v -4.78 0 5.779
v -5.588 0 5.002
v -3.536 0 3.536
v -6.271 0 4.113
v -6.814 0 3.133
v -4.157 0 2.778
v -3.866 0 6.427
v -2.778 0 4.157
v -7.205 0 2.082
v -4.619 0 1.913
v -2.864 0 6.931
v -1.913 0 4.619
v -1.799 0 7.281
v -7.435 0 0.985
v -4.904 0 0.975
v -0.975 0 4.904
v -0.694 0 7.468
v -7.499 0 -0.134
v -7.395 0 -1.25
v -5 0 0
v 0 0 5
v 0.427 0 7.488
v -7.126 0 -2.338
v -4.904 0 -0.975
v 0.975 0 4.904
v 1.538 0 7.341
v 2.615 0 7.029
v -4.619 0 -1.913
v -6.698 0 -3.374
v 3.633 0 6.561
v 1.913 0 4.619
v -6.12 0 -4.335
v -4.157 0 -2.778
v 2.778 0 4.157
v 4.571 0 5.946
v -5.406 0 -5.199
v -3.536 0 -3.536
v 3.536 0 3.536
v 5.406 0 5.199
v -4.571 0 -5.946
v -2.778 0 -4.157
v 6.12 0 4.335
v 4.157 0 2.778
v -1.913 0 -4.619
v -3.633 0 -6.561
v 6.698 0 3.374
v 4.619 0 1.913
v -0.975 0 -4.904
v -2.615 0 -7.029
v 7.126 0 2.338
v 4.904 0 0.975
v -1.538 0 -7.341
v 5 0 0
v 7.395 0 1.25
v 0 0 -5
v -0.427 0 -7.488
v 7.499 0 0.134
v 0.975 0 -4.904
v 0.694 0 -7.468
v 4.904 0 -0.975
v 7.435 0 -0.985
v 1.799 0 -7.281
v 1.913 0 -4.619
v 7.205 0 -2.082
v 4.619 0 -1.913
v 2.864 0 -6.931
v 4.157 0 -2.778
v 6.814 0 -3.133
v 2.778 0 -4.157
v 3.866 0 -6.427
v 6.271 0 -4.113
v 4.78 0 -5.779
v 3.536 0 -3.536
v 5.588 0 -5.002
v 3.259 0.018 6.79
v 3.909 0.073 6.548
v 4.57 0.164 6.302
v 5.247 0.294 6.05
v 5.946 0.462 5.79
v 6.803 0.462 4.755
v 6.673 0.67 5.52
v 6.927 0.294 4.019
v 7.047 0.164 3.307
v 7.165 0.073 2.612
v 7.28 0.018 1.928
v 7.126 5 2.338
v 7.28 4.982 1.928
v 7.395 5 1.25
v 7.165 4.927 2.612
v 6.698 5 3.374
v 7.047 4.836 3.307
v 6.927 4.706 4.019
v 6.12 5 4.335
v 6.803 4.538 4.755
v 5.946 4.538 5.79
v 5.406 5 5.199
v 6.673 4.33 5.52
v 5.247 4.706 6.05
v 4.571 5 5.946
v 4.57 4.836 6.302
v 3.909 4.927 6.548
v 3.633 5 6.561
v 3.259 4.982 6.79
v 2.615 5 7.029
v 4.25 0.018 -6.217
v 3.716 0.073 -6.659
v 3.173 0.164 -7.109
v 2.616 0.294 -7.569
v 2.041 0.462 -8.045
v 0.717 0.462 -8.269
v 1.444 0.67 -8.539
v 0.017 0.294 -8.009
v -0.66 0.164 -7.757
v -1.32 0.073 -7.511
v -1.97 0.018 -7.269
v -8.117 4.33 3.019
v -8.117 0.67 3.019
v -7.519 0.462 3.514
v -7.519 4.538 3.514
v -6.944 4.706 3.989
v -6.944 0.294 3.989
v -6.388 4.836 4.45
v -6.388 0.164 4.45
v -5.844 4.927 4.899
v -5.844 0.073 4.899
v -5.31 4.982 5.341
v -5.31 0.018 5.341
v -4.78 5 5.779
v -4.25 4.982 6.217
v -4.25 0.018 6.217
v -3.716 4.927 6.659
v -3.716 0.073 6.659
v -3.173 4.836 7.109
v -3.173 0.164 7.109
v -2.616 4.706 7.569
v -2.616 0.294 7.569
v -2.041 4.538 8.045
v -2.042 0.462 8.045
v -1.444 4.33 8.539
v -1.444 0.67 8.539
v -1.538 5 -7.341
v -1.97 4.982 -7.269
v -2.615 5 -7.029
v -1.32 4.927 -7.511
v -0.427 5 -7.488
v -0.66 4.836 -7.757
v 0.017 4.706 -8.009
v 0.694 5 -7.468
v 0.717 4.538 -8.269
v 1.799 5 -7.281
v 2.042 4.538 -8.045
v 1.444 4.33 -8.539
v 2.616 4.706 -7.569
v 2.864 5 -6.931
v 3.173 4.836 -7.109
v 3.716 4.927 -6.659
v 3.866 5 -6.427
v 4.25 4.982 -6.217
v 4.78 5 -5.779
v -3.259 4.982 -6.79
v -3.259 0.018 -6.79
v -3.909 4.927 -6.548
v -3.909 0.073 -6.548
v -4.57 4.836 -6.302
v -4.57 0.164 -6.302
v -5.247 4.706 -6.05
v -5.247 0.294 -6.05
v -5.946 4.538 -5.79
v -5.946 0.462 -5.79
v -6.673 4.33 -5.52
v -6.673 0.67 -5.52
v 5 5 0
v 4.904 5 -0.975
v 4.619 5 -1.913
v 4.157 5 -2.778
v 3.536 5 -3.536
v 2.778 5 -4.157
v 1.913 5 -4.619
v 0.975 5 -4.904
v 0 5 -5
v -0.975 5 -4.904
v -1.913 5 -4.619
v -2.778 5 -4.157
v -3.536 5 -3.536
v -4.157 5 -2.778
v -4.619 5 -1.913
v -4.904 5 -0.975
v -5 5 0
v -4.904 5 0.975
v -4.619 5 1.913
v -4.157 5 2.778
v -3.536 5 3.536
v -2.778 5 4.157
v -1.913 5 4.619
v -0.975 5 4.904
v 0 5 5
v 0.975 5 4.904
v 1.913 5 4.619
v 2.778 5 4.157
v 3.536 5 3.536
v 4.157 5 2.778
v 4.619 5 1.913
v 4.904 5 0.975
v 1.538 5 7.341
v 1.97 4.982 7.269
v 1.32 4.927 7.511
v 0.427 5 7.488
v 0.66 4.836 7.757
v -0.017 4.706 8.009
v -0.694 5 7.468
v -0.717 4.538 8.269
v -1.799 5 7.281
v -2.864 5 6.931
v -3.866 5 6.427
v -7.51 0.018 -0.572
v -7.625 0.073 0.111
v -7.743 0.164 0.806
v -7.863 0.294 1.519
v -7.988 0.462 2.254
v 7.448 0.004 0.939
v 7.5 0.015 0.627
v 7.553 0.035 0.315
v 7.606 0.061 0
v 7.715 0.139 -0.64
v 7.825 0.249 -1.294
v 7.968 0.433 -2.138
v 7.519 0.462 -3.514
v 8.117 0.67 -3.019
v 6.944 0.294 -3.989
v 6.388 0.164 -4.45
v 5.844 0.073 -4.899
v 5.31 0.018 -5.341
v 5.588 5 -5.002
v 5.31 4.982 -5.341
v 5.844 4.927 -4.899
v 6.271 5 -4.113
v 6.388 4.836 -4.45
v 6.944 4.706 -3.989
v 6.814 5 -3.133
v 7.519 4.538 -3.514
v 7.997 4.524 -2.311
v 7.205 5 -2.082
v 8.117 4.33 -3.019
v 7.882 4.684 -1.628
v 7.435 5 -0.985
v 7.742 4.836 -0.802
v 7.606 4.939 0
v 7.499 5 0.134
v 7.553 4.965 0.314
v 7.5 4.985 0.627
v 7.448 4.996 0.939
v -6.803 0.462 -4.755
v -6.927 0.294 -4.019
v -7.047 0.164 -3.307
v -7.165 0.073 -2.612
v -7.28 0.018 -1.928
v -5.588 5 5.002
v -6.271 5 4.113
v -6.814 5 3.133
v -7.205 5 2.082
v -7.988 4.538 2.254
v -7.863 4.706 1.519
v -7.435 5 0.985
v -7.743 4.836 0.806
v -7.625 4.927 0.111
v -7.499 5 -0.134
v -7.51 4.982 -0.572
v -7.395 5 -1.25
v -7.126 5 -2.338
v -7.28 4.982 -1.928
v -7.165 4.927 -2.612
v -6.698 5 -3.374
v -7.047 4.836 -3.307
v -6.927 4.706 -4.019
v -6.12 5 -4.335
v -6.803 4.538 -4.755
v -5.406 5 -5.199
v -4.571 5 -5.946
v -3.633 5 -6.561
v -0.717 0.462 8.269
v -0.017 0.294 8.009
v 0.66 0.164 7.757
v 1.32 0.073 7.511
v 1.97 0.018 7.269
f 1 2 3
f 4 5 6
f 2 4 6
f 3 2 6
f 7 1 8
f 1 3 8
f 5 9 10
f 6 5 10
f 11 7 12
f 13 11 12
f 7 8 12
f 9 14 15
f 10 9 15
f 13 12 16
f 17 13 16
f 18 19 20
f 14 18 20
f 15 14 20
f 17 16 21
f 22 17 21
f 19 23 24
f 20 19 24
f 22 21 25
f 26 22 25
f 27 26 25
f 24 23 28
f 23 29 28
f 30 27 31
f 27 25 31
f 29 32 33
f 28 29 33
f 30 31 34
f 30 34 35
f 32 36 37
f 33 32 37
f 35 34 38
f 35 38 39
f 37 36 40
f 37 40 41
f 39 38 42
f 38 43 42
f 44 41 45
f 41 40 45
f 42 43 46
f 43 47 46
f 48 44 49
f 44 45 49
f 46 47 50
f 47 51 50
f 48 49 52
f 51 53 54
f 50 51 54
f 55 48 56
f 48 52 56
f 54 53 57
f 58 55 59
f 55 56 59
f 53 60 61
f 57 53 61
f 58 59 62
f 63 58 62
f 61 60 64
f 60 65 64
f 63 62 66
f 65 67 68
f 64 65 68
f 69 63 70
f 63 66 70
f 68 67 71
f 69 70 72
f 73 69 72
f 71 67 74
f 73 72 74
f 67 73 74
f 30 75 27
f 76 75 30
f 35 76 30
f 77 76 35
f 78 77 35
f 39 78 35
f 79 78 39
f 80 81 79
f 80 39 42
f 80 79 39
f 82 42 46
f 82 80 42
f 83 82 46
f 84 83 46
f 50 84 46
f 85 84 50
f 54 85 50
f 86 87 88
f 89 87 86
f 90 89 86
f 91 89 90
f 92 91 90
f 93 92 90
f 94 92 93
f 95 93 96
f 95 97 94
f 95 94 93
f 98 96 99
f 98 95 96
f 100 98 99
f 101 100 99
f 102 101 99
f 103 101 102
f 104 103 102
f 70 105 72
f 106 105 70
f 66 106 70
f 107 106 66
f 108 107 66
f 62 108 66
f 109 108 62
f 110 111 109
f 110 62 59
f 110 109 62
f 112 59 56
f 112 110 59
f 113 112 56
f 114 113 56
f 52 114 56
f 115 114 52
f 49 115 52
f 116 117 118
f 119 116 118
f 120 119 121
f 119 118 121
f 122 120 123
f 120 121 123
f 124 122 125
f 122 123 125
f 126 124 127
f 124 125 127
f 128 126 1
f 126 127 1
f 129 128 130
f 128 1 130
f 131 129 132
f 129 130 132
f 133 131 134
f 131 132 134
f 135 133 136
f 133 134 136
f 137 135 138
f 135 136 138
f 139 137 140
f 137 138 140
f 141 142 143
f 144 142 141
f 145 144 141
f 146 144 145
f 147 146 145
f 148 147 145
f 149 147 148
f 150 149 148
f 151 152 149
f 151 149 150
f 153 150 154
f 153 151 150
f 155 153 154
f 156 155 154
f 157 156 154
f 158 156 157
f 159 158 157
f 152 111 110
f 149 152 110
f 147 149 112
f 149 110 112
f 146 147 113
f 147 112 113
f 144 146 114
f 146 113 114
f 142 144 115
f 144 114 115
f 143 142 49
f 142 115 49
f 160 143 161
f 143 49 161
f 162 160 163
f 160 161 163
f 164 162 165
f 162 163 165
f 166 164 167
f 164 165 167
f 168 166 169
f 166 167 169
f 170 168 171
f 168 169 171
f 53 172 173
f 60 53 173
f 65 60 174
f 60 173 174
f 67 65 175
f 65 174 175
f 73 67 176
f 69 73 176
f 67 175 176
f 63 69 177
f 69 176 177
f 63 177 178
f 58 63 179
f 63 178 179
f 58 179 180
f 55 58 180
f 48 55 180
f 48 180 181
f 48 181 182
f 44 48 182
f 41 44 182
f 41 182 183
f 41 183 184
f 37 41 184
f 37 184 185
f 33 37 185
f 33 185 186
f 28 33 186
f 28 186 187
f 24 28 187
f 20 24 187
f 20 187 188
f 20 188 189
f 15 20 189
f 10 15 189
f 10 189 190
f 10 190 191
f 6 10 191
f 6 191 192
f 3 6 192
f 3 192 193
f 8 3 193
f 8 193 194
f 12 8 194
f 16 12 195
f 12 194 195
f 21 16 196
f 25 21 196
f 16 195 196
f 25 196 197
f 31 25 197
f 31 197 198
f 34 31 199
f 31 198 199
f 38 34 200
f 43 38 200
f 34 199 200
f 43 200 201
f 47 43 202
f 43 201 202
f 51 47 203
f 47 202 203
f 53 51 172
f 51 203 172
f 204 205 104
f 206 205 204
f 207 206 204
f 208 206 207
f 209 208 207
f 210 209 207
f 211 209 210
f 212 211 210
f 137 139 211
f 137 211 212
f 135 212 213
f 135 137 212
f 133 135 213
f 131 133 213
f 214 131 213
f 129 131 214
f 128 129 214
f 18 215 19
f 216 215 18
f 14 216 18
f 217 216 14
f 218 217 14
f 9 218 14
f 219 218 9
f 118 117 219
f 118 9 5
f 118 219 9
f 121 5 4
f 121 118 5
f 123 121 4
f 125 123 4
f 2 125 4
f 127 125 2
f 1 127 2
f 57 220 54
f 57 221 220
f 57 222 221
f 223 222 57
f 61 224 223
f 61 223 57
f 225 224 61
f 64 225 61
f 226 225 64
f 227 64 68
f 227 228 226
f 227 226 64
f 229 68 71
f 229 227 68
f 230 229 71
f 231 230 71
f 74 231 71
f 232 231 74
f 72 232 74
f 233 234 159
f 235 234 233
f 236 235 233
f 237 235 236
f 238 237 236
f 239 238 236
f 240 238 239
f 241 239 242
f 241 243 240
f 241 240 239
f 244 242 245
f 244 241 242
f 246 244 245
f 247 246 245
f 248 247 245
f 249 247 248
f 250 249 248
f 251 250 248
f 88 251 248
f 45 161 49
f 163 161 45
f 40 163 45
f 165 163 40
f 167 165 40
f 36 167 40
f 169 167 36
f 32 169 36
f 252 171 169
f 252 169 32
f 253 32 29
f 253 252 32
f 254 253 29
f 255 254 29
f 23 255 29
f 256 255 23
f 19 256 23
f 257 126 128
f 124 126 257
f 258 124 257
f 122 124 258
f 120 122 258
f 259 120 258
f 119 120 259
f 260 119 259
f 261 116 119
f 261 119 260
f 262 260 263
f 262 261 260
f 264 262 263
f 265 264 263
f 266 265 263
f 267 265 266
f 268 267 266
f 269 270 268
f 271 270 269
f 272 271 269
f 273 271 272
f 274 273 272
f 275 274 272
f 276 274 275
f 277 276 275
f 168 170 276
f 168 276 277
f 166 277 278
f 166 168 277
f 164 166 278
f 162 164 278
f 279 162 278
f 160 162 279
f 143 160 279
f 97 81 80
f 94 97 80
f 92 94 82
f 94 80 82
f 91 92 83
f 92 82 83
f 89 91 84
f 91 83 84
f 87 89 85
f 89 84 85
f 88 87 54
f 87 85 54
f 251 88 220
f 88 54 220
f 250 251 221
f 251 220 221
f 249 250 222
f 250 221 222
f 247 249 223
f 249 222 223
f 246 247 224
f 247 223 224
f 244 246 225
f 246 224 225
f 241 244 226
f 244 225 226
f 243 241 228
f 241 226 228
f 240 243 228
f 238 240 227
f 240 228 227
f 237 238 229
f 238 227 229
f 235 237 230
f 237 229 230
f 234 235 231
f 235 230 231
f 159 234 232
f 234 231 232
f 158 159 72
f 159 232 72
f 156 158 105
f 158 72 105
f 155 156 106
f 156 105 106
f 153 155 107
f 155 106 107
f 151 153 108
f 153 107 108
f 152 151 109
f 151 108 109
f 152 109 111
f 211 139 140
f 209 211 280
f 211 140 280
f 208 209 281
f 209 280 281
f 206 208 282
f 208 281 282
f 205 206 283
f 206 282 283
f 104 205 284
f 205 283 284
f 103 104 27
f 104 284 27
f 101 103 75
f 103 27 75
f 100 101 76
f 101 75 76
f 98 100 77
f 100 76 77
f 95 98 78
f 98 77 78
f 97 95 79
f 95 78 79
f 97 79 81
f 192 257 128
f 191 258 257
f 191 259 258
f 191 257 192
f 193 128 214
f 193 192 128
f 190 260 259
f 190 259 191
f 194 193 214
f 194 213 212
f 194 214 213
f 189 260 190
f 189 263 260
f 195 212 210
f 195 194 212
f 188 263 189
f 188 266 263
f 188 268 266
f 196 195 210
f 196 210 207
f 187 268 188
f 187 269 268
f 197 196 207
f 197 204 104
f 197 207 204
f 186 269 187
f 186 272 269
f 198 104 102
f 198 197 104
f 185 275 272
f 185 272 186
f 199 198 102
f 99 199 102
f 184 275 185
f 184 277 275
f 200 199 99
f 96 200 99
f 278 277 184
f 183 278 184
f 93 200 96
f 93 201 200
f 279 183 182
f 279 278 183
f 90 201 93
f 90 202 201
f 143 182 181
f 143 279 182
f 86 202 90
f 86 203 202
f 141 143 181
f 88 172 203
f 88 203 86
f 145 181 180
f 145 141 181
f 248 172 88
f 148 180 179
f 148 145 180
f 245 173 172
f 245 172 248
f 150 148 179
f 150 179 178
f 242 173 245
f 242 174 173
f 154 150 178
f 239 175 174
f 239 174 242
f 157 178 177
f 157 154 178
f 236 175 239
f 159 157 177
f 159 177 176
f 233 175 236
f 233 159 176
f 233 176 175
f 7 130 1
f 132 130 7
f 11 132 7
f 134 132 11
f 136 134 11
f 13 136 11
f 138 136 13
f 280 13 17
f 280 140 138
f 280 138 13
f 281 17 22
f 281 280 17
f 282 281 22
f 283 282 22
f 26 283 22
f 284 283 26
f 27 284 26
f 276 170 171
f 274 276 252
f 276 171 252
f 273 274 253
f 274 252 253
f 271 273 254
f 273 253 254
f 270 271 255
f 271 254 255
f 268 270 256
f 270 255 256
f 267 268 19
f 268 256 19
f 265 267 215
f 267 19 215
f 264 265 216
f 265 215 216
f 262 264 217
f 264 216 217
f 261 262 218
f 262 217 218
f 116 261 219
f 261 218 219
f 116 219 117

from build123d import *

# Parameters (mm, degrees)
BOSS_EXTRUDE1_DEPTH = 5
SKETCH7_OUTSIDE_W   = 26.516
SKETCH7_OUTSIDE_H   = 27.36
SKETCH7_OUTSIDE_R   = 7.5
CUT_EXTRUDE4_DEPTH  = 1
CUT_EXTRUDE4_TAPER  = 60
SKETCH8_OUTSIDE_W   = 26.516
SKETCH8_OUTSIDE_H   = 27.36
SKETCH8_OUTSIDE_R   = 7.5
CUT_EXTRUDE5_DEPTH  = 1
CUT_EXTRUDE5_TAPER  = 60
SKETCH9_R           = 5
CUT_EXTRUDE6_DEPTH  = 9


with BuildPart() as part:
    # Sketch1 → Boss-Extrude1 (new body)
    with BuildSketch(Plane(origin=(0, 0, 0), x_dir=(1, 0, 0), z_dir=(0, 1, 0))):
        Polygon((6.673205692, -5.519812116), (8.116900362, 3.019259596), (1.44369467, 8.539071712), (-6.673205692, 5.519812116), (-8.116900362, -3.019259596), (-1.44369467, -8.539071712), align=None)
    extrude(amount=BOSS_EXTRUDE1_DEPTH)

    # Sketch7 outside → Cut-Extrude4 (cut)
    with BuildSketch(Plane(origin=(0, 5, 0), x_dir=(1, 0, 0), z_dir=(0, 1, 0))):
        Rectangle(SKETCH7_OUTSIDE_W, SKETCH7_OUTSIDE_H)
        Circle(SKETCH7_OUTSIDE_R, mode=Mode.SUBTRACT)
    extrude(amount=-CUT_EXTRUDE4_DEPTH, taper=CUT_EXTRUDE4_TAPER, mode=Mode.SUBTRACT)

    # Sketch8 outside → Cut-Extrude5 (cut)
    with BuildSketch(Plane.XZ):
        Rectangle(SKETCH8_OUTSIDE_W, SKETCH8_OUTSIDE_H)
        Circle(SKETCH8_OUTSIDE_R, mode=Mode.SUBTRACT)
    extrude(amount=-CUT_EXTRUDE5_DEPTH, taper=CUT_EXTRUDE5_TAPER, mode=Mode.SUBTRACT)

    # Sketch9 → Cut-Extrude6 (cut)
    with BuildSketch(Plane(origin=(0, 5, 0), x_dir=(1, 0, 0), z_dir=(0, 1, 0))):
        Circle(SKETCH9_R)
    extrude(amount=-CUT_EXTRUDE6_DEPTH, mode=Mode.SUBTRACT)


solid = part.part
